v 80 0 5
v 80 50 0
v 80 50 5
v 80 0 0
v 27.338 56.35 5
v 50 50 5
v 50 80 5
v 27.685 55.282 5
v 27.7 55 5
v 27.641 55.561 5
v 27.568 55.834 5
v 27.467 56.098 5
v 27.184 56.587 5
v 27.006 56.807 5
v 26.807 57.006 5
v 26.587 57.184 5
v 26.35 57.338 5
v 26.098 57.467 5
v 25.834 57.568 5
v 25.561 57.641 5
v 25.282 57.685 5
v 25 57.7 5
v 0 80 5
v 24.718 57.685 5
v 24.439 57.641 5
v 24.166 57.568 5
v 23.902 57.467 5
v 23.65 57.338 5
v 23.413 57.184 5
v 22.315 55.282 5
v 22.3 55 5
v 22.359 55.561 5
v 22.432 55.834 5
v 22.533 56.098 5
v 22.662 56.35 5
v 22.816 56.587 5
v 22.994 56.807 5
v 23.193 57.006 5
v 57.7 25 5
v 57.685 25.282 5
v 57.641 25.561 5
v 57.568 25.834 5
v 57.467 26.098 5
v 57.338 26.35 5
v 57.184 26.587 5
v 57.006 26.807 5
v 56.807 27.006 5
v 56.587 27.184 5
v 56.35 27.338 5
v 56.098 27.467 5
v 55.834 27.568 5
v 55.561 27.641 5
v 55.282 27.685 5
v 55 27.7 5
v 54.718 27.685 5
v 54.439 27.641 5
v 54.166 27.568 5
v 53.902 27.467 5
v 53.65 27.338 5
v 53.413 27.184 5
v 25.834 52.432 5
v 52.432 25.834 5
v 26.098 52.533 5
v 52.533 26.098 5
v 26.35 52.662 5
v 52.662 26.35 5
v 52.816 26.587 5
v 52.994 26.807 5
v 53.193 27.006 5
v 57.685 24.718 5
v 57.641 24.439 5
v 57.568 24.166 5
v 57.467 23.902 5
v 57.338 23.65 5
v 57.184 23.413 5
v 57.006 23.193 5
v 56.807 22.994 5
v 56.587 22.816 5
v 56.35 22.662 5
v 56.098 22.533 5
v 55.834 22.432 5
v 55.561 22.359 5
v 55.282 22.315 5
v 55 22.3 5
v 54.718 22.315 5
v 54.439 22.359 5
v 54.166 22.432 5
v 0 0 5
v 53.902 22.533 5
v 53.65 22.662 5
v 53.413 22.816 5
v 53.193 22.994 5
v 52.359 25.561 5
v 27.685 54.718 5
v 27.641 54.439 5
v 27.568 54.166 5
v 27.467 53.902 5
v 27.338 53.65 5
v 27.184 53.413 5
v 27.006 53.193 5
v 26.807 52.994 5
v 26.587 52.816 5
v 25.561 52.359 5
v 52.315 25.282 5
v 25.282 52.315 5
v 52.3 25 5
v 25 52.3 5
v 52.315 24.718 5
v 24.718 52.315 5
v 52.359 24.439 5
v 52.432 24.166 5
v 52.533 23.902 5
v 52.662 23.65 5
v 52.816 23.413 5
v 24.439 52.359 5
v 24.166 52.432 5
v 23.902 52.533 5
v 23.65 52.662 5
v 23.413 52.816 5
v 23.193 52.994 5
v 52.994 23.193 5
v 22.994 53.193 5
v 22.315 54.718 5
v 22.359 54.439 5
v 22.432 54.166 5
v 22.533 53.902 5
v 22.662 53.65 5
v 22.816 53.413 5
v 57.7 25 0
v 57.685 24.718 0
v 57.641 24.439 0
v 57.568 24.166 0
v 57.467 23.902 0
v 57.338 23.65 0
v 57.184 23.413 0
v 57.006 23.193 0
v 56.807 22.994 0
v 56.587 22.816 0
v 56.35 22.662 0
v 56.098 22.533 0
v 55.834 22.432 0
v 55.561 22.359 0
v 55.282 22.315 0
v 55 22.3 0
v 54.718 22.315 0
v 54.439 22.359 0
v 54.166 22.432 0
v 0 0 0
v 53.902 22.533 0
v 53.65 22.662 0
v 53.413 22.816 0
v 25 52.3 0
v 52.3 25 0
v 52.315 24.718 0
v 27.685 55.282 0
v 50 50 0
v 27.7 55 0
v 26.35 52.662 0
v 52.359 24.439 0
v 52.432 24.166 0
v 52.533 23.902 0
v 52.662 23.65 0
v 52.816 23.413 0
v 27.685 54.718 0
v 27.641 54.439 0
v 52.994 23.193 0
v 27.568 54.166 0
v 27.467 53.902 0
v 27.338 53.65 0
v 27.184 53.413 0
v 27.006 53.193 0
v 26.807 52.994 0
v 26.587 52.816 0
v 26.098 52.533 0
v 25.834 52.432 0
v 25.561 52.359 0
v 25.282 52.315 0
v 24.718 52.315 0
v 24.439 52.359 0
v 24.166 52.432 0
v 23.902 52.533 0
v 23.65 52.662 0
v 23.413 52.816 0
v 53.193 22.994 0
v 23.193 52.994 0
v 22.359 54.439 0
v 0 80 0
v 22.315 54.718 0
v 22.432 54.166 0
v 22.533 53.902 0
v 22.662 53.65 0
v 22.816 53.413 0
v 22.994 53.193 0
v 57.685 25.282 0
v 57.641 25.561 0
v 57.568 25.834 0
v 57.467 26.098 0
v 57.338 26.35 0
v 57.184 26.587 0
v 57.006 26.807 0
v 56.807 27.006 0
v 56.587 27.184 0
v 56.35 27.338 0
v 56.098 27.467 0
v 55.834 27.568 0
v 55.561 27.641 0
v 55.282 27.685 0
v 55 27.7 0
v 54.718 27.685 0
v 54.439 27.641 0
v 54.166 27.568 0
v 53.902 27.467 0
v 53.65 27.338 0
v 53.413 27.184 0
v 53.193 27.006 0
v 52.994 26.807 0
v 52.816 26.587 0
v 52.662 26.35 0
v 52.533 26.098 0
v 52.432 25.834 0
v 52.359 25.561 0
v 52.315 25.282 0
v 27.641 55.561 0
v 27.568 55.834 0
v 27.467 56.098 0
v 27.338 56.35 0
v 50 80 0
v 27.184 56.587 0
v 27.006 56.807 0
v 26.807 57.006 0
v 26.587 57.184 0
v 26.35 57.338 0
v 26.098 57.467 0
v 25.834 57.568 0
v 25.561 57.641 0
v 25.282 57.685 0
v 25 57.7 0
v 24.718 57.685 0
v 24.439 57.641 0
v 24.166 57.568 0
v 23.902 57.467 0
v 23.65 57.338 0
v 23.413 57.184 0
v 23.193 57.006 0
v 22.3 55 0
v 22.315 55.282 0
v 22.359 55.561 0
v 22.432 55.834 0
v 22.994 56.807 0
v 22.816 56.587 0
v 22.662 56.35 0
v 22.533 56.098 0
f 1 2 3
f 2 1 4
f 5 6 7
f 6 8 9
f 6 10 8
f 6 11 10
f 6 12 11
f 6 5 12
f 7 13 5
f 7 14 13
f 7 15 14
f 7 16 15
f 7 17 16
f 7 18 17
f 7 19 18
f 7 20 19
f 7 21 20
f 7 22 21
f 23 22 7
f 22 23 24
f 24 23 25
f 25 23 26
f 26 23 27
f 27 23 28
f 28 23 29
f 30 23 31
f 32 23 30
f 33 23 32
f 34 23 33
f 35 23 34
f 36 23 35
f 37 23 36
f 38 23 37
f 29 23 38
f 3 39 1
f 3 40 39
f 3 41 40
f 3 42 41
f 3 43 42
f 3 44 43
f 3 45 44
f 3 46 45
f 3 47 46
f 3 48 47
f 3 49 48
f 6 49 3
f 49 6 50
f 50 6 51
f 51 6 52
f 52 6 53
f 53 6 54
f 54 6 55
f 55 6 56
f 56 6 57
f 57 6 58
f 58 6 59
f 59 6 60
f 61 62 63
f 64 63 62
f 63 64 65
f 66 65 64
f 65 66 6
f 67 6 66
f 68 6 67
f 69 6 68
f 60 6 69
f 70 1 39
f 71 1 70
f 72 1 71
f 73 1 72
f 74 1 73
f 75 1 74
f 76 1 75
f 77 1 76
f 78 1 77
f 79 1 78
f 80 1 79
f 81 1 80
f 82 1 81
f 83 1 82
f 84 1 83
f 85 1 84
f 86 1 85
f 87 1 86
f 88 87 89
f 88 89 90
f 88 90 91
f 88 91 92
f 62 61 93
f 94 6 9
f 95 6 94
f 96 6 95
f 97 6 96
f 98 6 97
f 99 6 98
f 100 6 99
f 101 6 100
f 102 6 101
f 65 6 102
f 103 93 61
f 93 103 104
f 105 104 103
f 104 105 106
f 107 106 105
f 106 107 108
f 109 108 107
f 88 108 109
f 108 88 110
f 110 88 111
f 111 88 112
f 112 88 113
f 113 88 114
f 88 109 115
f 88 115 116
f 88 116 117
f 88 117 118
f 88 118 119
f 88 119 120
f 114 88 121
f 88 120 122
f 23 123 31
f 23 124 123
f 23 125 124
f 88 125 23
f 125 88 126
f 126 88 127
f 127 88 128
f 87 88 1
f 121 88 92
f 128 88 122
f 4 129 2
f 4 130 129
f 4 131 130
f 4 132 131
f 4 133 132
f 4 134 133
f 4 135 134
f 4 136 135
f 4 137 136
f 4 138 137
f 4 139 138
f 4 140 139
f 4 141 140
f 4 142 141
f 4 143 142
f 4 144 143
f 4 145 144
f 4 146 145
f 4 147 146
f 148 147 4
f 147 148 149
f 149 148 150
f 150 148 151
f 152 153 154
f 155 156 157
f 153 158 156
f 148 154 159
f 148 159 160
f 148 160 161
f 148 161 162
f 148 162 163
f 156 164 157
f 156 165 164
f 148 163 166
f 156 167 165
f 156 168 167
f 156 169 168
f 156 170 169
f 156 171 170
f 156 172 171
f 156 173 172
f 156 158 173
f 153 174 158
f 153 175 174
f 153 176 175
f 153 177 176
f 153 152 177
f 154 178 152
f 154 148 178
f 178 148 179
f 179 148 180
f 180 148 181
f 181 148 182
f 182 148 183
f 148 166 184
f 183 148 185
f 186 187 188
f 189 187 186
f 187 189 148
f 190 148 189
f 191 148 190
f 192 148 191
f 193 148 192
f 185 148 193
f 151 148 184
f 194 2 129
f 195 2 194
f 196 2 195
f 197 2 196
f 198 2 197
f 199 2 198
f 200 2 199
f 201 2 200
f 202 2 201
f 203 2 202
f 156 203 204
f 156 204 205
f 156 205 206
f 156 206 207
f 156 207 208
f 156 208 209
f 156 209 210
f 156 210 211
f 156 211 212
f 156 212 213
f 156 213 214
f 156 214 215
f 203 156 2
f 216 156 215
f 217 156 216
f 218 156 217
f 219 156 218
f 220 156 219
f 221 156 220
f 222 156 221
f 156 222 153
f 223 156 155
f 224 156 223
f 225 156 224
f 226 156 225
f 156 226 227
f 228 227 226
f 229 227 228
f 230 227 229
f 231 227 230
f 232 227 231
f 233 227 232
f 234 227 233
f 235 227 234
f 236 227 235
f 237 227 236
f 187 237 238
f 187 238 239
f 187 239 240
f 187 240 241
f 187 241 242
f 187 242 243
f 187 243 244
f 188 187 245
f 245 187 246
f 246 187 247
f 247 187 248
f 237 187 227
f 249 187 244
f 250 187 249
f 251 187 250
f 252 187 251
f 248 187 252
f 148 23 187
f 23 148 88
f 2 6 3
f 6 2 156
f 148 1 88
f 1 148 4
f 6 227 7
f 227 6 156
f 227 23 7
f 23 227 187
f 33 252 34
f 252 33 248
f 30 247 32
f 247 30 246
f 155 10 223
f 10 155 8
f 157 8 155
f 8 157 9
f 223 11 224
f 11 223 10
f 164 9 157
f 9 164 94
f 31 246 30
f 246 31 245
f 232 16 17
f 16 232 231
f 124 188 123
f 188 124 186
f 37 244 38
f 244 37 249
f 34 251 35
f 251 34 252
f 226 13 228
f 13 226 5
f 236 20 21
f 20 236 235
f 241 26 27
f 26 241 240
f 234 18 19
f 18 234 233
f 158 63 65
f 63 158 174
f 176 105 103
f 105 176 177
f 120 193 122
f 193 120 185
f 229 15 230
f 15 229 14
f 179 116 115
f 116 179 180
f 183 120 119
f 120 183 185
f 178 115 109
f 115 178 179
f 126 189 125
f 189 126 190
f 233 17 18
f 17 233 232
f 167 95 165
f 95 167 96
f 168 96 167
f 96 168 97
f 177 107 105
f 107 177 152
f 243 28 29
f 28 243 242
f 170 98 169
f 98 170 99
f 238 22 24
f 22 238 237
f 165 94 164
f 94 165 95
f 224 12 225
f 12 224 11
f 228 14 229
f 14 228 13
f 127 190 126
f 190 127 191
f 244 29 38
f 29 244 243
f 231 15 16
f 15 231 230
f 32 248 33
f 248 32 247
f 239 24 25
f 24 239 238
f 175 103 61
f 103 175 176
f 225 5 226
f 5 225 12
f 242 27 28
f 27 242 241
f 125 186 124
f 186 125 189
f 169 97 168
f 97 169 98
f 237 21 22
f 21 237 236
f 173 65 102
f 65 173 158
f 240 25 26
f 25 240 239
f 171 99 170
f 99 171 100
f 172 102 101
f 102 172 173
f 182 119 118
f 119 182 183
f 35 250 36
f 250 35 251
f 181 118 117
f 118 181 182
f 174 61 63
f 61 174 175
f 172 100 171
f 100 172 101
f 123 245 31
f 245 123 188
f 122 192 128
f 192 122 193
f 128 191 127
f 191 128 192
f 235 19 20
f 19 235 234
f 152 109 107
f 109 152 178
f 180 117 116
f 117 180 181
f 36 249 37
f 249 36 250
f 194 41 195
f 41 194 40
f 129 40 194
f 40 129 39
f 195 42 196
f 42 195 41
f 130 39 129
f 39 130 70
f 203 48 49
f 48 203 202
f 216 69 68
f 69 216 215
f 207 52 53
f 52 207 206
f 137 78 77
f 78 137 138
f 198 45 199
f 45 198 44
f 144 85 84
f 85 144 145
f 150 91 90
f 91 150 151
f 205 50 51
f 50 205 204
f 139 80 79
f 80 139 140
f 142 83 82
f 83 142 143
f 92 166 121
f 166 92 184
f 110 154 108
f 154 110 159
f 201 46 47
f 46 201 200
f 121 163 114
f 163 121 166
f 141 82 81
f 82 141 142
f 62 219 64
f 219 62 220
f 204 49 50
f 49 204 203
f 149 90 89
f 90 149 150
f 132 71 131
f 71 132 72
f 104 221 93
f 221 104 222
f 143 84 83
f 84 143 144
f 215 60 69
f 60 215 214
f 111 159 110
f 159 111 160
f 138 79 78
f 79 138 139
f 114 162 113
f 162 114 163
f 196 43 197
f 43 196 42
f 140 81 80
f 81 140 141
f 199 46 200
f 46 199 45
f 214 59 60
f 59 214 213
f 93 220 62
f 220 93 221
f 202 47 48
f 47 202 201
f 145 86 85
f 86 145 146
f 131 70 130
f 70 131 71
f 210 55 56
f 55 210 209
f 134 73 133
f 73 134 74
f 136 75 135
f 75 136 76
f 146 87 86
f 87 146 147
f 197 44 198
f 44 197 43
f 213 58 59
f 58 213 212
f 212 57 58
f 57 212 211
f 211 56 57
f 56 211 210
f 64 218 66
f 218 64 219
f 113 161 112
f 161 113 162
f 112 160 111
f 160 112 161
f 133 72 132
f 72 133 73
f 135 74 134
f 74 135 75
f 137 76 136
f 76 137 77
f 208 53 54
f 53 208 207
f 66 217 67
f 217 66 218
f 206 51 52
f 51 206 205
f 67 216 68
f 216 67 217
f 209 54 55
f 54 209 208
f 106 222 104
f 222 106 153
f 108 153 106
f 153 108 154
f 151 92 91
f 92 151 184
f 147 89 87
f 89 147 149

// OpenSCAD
// V-slot corner connector.
$fn = 60;
eps = 0.02;
profile = 50;
arm = 80;
plate_t = 5;
difference() {
    union() { cube([arm,profile,plate_t]); cube([profile,arm,plate_t]); }
    for (p=[[profile/2,arm-profile/2],[arm-profile/2,profile/2]]) translate([p[0],p[1],-eps]) cylinder(d=5.4,h=plate_t+2*eps);
}
